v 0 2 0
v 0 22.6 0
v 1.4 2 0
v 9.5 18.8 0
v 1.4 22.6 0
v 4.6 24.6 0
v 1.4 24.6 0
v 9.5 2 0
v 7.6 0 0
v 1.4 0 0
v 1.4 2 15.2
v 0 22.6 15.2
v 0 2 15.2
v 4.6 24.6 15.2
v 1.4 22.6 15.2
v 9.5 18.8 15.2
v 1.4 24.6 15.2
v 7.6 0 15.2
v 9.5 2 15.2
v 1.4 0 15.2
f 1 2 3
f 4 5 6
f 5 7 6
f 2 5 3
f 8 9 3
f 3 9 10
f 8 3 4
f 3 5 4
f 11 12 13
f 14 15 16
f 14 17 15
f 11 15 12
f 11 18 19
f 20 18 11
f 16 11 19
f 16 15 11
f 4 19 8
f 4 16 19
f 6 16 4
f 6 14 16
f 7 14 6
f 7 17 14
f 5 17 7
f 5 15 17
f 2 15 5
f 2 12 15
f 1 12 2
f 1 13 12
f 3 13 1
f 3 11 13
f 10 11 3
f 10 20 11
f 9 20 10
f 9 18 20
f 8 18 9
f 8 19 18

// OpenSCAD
// file: keystone.scad
function keystonePoints() = [
    [0,2],
    [1.4,2],
    [1.4,0],    
    [7.6,0],
    [9.5,2],
    [9.5,18.8],
    [4.6,24.6],
    [1.4,24.6],
    [1.4,22.6],
    [0,22.6],
];

function keystoneBlankPoints() = [
    [0,0],
    [0,16.2],
    [16.8,16.2],
    [16.8,17.7],
    [5.5,17.7],
    [5.5,19.1],
    [8.5,20.5],
    [8.5,19.3],
    [10.5,19.3],
    [10.5,20.5],
    [12.5,20.5],
    [12.5,19.3],
    [19,19.3],
    [19,14.8],
    [2.8,14.8],
    [2.8,1.6],
    [12.5,1.6],
    [12.5,-1.2],
    [10.5,-1.2],
    [10.5,0],
    [8.5,0],
    [8.5,-1.2],
    [5.5,0],
];

function keystoneWidth() = 15.2;
function keystoneHeight() = 24.6;
function keystoneDepth() = 9.5;

function keystoneBlankWidth() = 14.5;

module keystoneCutout(center=false) {
    let(w=keystoneWidth(), h=keystoneHeight(), z=keystoneDepth()) {
        translate([center ? w/-2 : 0,center ? h/-2 : 0,center ? z : 0])
            rotate([0,center ? 90 : 0,0])
                linear_extrude(w) 
                    polygon(keystonePoints());
    }
}

module keystoneBlank(center=false) {
    // The centering here is on the blank face, rather than the 
    // entire geometry. This makes it easier to mod.
    let(w=keystoneBlankWidth(), h=16.2, z=0) {
        translate([center ? w/2 : 0,center ? h/-2 : 0,center ? z : 0])
            rotate([0,center ? -90 : 0,0])
                linear_extrude(w) 
                    polygon(keystoneBlankPoints());
    }
}

module keystonePort(border=4.1, center=false) {
    let(w=keystoneWidth(), h=keystoneHeight(), z=keystoneDepth()) {
        translate([center ? 0 : 4,center ? 0 : 4,0]) difference() {
            linear_extrude(z)
                offset(delta=border, chamfer=true)
                    square([w,h], center=center);
            
            translate([center ? 0 : w,0,0])
                rotate([0,center ? 0 : -90,0])
                    keystoneCutout(center);
        }
    }
}
// main file
include <keystone.scad>

Select = 0; // [0:keystoneCutout, 1:keystonePort, 2:keystoneBlank]

Center = false;

if (Select==0) {
    keystoneCutout(center=Center);
} else if (Select==1) {
    keystonePort(center=Center);
} else if (Select==2) {
    keystoneBlank(center=Center);
}
